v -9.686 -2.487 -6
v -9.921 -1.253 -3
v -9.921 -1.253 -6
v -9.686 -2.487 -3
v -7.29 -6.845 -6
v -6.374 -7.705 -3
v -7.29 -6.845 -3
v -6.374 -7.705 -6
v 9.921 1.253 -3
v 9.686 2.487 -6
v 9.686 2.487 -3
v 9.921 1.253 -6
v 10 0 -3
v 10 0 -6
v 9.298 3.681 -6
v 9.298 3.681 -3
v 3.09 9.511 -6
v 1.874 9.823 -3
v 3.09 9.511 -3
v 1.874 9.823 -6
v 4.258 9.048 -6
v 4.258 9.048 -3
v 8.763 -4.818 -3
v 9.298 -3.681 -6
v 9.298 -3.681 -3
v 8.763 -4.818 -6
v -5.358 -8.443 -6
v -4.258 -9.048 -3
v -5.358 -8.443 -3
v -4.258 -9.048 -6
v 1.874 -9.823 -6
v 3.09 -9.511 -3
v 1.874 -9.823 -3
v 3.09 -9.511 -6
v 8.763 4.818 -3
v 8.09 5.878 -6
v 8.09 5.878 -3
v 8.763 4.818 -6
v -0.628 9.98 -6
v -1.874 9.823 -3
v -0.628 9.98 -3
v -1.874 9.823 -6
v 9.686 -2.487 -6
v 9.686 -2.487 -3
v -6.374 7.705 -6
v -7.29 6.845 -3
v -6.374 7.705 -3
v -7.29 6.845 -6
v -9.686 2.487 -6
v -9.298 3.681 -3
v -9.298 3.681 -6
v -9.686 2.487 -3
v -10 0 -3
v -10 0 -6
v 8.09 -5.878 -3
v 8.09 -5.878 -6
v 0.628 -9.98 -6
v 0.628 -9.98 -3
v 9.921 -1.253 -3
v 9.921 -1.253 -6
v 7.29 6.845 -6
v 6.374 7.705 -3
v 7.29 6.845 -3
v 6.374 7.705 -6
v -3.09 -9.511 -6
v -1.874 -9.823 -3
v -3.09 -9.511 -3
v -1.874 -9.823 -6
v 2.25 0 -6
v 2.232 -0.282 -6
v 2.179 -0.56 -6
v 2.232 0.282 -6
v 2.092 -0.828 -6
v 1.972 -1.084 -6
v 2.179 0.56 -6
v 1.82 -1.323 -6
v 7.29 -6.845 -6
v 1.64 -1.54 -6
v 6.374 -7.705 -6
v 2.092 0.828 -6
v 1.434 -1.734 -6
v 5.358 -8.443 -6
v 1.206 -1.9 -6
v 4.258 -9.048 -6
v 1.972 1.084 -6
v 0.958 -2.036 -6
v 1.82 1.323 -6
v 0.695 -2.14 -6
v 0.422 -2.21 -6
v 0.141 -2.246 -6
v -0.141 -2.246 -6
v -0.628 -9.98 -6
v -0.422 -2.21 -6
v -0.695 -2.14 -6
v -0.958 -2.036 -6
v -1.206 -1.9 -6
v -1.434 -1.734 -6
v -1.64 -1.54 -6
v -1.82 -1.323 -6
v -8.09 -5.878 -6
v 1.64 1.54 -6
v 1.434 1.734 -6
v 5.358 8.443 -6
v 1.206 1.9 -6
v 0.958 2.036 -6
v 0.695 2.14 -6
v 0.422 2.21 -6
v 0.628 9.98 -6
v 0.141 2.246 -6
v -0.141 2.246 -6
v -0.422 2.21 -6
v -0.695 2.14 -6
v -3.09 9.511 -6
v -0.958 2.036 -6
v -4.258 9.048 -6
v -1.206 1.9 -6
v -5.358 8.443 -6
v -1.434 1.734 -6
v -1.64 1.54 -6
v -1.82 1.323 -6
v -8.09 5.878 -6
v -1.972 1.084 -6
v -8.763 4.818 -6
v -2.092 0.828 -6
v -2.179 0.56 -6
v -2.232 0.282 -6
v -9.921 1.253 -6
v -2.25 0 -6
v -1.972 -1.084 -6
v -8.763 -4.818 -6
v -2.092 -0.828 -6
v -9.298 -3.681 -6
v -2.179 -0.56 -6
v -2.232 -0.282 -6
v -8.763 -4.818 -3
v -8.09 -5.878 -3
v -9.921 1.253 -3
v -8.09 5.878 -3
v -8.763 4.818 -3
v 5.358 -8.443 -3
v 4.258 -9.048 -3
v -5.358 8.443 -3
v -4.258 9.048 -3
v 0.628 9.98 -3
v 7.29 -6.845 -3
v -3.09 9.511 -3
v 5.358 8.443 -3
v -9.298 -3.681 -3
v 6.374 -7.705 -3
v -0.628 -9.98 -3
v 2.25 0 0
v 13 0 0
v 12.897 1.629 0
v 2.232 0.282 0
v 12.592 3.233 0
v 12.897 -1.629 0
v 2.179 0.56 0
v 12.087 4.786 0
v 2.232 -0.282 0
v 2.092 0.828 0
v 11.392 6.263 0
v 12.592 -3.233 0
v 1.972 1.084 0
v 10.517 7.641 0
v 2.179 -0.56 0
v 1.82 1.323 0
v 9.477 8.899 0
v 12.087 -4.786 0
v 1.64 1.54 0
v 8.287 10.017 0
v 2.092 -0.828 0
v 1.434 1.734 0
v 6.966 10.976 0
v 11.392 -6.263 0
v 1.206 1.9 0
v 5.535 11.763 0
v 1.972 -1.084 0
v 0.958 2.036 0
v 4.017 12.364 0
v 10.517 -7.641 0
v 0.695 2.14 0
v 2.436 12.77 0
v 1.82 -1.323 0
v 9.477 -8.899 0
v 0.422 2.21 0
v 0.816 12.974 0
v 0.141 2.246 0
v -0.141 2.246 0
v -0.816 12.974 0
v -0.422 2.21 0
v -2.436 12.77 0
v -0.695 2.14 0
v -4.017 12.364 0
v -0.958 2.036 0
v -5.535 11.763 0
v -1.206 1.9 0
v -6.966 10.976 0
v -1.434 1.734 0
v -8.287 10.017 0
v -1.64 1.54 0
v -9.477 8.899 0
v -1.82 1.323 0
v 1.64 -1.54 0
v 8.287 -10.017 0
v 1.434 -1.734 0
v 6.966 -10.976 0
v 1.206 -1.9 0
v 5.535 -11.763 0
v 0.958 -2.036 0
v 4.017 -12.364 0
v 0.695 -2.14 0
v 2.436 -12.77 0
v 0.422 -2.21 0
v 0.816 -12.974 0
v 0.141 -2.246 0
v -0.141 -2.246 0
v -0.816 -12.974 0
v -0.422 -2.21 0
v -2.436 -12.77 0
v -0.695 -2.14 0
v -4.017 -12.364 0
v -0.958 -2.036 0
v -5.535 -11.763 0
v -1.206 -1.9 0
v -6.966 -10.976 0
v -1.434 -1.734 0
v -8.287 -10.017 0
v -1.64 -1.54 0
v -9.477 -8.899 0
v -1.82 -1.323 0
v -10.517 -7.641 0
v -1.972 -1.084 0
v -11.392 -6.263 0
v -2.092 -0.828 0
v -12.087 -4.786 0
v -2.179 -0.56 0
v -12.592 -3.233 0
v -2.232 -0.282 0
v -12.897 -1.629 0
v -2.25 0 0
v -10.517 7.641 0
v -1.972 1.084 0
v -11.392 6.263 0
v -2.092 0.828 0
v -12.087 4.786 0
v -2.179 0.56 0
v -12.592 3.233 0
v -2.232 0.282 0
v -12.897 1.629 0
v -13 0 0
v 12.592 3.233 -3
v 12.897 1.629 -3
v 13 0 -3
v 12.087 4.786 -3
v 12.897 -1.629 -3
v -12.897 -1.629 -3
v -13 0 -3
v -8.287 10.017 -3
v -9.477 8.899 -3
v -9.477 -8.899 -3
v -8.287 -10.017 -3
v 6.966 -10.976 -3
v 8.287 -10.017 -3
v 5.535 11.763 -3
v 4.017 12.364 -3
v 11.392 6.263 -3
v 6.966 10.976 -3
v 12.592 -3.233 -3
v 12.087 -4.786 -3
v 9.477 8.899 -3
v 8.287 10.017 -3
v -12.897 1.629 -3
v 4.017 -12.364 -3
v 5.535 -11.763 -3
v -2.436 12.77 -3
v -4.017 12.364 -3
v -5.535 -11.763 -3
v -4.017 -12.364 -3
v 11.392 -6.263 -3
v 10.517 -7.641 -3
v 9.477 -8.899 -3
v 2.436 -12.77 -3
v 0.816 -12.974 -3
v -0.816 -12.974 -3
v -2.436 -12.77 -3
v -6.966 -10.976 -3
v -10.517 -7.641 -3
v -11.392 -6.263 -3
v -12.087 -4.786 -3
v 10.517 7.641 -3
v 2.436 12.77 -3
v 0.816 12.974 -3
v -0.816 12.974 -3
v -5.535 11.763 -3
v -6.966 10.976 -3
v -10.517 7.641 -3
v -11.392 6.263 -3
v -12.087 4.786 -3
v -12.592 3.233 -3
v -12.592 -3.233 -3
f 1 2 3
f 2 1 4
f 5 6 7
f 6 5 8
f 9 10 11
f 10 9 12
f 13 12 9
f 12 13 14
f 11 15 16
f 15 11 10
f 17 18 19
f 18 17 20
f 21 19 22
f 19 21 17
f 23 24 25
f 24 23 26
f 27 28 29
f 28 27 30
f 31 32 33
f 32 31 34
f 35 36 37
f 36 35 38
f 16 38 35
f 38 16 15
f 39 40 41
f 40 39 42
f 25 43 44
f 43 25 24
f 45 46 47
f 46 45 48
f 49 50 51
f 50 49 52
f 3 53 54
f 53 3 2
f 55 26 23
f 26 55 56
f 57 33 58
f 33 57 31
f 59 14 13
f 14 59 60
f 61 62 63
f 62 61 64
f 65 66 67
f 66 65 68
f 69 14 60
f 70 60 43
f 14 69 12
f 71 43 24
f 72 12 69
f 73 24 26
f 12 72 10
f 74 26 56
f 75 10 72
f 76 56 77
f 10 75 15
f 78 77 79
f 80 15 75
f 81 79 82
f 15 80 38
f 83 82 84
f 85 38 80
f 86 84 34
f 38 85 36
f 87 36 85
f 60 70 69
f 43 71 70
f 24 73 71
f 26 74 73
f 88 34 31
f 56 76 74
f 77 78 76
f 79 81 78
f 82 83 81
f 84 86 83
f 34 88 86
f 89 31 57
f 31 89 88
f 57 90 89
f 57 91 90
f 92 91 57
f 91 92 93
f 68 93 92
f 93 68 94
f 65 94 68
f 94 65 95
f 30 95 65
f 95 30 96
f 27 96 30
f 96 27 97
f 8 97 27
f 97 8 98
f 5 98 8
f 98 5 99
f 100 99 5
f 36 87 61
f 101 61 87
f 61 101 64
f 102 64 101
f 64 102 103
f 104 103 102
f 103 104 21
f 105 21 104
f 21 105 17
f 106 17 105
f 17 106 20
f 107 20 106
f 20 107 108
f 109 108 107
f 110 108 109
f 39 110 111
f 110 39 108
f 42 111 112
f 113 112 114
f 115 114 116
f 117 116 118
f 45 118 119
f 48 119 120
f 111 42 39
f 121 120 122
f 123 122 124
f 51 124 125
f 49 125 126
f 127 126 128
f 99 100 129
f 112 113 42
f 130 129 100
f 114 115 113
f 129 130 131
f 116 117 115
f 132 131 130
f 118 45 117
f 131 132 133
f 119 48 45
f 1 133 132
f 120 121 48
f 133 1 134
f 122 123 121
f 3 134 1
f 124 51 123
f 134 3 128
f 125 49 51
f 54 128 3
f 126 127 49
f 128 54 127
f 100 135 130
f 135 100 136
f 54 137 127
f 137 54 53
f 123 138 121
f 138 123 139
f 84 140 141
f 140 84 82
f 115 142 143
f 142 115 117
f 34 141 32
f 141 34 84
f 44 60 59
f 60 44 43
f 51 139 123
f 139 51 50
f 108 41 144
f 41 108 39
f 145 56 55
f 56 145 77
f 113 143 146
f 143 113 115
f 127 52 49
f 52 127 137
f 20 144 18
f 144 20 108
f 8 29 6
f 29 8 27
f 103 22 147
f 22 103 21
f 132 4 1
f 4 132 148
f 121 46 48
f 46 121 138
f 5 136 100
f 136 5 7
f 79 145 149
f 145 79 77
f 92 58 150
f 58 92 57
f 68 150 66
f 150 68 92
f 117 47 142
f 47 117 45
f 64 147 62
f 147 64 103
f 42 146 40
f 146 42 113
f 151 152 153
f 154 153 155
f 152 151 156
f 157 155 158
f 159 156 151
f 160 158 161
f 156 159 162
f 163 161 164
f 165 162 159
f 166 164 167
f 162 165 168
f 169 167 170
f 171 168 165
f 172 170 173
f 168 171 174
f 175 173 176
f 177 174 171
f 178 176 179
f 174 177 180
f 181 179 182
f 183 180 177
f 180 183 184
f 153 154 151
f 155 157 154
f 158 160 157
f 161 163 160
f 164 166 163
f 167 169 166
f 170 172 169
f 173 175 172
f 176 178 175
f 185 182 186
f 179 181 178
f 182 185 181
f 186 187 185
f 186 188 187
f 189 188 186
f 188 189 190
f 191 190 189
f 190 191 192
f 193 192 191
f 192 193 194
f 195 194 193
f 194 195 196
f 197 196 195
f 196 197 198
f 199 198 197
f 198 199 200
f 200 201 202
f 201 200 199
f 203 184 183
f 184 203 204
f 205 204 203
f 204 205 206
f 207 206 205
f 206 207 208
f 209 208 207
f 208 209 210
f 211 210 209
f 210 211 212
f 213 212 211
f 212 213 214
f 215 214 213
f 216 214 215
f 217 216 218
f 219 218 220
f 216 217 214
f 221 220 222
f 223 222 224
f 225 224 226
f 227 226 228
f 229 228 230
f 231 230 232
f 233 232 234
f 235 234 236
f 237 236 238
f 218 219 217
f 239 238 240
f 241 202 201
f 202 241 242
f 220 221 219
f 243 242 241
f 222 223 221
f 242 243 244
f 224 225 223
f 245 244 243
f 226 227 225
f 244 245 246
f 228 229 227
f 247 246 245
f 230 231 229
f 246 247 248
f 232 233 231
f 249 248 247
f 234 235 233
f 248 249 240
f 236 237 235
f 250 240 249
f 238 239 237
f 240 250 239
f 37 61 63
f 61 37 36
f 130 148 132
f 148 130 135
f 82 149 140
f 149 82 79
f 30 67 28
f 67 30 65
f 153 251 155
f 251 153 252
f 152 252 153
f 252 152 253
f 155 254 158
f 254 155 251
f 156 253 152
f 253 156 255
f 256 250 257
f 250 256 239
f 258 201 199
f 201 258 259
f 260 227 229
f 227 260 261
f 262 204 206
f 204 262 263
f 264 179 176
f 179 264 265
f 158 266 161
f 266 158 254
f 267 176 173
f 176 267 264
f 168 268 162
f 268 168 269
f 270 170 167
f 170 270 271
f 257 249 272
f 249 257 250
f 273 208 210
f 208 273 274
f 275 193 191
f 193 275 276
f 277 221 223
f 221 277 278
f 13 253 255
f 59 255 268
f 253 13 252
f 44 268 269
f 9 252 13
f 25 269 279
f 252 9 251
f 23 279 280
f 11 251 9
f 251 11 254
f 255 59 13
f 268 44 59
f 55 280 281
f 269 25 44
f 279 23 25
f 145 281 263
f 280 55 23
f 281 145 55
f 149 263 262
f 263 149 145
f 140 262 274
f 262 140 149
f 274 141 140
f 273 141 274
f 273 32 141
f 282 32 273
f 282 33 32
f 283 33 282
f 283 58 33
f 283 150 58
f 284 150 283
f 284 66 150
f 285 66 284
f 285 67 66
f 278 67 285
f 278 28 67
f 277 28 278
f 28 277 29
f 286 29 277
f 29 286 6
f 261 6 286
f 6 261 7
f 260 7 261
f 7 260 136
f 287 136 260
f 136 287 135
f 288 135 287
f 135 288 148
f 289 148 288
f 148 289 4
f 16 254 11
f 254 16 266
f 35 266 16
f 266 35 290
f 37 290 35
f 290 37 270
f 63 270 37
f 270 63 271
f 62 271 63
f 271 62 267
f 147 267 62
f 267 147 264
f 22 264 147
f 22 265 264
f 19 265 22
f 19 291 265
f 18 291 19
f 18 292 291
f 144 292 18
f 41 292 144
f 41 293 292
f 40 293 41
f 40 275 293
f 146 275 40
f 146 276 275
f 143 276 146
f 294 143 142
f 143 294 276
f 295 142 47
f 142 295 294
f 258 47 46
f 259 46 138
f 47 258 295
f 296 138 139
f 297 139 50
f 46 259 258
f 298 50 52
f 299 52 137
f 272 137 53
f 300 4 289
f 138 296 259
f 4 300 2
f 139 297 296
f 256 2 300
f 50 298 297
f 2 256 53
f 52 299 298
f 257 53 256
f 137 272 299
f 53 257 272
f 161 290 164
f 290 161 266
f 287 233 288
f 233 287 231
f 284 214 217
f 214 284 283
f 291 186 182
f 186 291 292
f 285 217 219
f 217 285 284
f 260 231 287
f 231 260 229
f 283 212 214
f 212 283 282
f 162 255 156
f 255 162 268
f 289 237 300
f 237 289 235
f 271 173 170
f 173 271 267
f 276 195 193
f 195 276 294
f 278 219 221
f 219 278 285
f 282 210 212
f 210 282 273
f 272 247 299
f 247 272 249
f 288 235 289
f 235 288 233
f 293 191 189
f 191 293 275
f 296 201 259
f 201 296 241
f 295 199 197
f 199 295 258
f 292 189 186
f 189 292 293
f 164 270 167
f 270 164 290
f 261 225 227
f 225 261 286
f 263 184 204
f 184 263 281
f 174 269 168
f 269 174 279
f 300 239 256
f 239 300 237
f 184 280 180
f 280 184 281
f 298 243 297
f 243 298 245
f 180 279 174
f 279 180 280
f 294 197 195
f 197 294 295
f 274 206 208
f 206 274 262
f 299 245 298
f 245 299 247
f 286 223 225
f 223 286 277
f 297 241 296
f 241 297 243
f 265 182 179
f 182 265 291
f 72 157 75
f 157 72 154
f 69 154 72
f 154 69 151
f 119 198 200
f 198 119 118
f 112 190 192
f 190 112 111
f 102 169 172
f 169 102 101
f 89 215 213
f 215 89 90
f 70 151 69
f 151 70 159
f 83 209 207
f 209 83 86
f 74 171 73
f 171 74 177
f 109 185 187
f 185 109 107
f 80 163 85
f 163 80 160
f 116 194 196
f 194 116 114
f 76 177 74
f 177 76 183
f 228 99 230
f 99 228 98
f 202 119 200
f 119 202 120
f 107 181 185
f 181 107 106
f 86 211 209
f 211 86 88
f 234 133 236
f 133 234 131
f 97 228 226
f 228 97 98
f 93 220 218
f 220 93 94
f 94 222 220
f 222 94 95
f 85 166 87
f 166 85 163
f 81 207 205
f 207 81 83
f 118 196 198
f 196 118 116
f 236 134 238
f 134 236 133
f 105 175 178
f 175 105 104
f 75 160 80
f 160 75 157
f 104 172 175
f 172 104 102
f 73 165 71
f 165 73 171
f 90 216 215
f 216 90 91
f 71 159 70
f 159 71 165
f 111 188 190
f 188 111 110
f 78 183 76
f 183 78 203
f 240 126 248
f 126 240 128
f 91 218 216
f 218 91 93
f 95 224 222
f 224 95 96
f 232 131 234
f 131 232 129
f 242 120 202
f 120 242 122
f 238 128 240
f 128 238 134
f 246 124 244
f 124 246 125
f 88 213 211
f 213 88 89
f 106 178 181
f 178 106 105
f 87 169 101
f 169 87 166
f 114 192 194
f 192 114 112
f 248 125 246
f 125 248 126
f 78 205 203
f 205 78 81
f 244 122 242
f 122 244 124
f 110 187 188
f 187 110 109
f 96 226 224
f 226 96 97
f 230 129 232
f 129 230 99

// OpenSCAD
$fn = 50;


difference() {
	union() {
		translate(v = [0, 0, -6.0000000000]) {
			cylinder(h = 6, r = 10.0000000000);
		}
		translate(v = [0, 0, -3.0000000000]) {
			cylinder(h = 3, r = 13.0000000000);
		}
	}
	union() {
		#translate(v = [0, 0, -6]) {
			cylinder(h = 6, r = 2.2500000000);
		}
	}
}
